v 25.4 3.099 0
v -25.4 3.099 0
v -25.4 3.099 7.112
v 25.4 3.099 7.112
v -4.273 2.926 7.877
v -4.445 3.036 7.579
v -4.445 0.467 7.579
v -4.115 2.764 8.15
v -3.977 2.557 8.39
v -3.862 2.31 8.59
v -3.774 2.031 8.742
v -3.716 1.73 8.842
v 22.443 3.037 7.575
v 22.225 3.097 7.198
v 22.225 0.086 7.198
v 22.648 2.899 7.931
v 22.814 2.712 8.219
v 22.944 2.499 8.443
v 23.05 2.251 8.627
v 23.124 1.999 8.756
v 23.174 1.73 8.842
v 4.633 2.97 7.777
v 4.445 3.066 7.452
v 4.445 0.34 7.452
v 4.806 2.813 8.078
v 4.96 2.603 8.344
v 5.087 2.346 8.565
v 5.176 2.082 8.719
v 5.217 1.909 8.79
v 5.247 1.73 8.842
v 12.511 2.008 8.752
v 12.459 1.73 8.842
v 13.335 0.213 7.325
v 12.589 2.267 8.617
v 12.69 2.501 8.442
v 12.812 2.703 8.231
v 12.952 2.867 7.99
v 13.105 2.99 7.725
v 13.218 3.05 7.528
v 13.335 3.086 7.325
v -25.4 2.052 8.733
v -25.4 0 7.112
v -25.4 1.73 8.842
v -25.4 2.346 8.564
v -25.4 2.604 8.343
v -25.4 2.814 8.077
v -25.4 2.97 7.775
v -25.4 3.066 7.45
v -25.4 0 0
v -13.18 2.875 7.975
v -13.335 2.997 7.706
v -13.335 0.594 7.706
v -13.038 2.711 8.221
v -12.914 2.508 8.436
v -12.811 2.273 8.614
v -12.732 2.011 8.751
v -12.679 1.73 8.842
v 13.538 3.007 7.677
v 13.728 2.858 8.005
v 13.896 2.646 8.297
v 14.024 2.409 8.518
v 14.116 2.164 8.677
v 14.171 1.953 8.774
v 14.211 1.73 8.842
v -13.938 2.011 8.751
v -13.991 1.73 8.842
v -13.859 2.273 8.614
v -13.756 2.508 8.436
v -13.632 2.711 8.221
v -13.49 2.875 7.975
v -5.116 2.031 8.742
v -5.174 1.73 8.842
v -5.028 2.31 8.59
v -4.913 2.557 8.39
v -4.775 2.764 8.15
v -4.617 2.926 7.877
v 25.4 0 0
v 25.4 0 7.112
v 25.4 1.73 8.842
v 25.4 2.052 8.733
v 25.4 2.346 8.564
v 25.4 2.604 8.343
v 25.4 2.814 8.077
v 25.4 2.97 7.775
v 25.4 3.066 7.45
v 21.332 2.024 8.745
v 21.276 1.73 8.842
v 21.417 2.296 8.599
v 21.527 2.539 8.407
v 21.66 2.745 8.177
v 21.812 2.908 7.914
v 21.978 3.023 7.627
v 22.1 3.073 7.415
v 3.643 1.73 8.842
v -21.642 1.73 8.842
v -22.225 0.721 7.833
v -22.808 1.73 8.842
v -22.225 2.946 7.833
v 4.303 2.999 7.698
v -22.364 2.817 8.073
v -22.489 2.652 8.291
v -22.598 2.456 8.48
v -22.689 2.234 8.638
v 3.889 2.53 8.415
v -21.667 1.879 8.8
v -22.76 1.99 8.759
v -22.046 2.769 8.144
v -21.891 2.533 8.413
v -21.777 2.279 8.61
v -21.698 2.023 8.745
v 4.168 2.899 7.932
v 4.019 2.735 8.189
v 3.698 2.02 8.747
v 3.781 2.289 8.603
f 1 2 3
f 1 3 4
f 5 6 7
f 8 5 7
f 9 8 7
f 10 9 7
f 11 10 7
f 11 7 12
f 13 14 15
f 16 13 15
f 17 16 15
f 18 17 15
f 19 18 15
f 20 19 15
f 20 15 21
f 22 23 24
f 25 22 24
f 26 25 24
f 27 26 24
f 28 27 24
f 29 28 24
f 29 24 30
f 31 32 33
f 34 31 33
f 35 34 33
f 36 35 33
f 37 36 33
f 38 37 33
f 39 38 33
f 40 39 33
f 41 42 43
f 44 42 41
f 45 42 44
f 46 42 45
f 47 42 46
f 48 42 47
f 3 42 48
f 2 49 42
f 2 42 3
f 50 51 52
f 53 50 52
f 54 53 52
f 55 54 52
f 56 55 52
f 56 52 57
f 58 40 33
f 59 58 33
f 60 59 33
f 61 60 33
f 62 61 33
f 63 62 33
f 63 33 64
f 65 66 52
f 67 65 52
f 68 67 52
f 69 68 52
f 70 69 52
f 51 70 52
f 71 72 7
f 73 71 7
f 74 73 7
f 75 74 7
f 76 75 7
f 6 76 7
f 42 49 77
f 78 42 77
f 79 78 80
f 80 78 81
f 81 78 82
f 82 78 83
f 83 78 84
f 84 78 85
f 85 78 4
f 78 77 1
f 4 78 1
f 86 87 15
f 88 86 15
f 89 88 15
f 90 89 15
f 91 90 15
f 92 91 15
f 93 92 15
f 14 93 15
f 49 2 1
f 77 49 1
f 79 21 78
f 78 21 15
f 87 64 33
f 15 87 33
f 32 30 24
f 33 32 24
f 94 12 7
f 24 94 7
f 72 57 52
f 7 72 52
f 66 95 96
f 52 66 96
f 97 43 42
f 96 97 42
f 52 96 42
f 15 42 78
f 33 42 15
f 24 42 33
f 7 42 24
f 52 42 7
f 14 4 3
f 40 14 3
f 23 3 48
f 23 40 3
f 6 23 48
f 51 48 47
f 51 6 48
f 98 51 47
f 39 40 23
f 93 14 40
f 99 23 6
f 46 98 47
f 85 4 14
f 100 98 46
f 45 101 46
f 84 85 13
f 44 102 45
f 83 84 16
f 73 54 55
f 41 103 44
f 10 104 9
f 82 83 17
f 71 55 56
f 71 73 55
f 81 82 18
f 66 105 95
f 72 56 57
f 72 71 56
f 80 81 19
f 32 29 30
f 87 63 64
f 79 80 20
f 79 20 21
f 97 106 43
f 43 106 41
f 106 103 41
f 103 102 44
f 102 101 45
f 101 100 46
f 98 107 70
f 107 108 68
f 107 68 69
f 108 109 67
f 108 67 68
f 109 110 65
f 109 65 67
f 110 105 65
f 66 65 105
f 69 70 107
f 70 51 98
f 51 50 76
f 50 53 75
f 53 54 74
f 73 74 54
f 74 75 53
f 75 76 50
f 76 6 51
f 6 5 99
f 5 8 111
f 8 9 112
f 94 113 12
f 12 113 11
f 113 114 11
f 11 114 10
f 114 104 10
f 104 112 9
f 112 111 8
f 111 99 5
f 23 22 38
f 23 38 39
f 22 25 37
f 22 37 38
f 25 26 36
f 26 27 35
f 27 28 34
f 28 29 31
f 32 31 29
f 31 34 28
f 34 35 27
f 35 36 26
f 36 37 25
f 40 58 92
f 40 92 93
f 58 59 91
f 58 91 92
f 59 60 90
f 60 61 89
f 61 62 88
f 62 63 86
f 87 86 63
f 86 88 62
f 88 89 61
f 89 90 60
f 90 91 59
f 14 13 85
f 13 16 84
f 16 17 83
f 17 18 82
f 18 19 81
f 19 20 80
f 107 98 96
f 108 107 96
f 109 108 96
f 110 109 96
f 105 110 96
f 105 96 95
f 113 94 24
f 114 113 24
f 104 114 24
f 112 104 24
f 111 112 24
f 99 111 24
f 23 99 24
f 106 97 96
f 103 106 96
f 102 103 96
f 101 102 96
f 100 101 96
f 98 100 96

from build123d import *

# Parameters (mm, degrees)
F0_W        = 50.8
F0_H        = 3.0988
F1_DEPTH    = 8.89
F3_R        = 1.778
F4_T1_DEPTH = 59.9449047052
F5_DEPTH    = 25.4


# Not quite as in the source:
# - a fillet or chamfer that OpenCascade refuses, or shapes differently, is made with other operations: its cross-section is extruded or revolved along the edge and cut away or added


with BuildPart() as f1:
    # F0 (on Top) → F1 (new body)
    with BuildSketch(Plane.XY):
        with Locations((0, 1.5494)):
            Rectangle(F0_W, F0_H)
    extrude(amount=F1_DEPTH)

    # F3
    f3_edges = [f1.edges().sort_by_distance(p)[0] for p in [
        (0, 3.0988, 8.89),
    ]]
    fillet(f3_edges, radius=F3_R)

    # F4: chamfer of 1.778 on 1 edges, made by hand

    # F4_s2 → F4_t1 (cut)
    with BuildSketch(Plane.YZ.offset(-29.9724523526)):
        Polygon((1.778, 8.89), (0, 7.112), (0, 8.89), align=None)
    extrude(amount=F4_T1_DEPTH, mode=Mode.SUBTRACT)

    # F2 (on face) → F5 (cut)
    with BuildSketch(Plane.XZ):
        Polygon((-22.225, 7.8332954744), (-21.6149113577, 8.89), (-22.8350886423, 8.89), align=None)
        Polygon((-12.6515878735, 8.89), (-14.0184121265, 8.89), (-13.335, 7.7062954744), align=None)
        Polygon((14.2383825791, 8.89), (12.4316174209, 8.89), (13.335, 7.3252954744), align=None)
        Polygon((22.225, 7.1982954744), (23.2017060633, 8.89), (21.2482939367, 8.89), align=None)
        Polygon((-3.6882643893, 8.89), (-5.2017356107, 8.89), (-4.445, 7.5792954744), align=None)
        Polygon((5.2750590949, 8.89), (3.6149409051, 8.89), (4.445, 7.4522954744), align=None)
    extrude(amount=-F5_DEPTH, mode=Mode.SUBTRACT)


solid = f1.part
